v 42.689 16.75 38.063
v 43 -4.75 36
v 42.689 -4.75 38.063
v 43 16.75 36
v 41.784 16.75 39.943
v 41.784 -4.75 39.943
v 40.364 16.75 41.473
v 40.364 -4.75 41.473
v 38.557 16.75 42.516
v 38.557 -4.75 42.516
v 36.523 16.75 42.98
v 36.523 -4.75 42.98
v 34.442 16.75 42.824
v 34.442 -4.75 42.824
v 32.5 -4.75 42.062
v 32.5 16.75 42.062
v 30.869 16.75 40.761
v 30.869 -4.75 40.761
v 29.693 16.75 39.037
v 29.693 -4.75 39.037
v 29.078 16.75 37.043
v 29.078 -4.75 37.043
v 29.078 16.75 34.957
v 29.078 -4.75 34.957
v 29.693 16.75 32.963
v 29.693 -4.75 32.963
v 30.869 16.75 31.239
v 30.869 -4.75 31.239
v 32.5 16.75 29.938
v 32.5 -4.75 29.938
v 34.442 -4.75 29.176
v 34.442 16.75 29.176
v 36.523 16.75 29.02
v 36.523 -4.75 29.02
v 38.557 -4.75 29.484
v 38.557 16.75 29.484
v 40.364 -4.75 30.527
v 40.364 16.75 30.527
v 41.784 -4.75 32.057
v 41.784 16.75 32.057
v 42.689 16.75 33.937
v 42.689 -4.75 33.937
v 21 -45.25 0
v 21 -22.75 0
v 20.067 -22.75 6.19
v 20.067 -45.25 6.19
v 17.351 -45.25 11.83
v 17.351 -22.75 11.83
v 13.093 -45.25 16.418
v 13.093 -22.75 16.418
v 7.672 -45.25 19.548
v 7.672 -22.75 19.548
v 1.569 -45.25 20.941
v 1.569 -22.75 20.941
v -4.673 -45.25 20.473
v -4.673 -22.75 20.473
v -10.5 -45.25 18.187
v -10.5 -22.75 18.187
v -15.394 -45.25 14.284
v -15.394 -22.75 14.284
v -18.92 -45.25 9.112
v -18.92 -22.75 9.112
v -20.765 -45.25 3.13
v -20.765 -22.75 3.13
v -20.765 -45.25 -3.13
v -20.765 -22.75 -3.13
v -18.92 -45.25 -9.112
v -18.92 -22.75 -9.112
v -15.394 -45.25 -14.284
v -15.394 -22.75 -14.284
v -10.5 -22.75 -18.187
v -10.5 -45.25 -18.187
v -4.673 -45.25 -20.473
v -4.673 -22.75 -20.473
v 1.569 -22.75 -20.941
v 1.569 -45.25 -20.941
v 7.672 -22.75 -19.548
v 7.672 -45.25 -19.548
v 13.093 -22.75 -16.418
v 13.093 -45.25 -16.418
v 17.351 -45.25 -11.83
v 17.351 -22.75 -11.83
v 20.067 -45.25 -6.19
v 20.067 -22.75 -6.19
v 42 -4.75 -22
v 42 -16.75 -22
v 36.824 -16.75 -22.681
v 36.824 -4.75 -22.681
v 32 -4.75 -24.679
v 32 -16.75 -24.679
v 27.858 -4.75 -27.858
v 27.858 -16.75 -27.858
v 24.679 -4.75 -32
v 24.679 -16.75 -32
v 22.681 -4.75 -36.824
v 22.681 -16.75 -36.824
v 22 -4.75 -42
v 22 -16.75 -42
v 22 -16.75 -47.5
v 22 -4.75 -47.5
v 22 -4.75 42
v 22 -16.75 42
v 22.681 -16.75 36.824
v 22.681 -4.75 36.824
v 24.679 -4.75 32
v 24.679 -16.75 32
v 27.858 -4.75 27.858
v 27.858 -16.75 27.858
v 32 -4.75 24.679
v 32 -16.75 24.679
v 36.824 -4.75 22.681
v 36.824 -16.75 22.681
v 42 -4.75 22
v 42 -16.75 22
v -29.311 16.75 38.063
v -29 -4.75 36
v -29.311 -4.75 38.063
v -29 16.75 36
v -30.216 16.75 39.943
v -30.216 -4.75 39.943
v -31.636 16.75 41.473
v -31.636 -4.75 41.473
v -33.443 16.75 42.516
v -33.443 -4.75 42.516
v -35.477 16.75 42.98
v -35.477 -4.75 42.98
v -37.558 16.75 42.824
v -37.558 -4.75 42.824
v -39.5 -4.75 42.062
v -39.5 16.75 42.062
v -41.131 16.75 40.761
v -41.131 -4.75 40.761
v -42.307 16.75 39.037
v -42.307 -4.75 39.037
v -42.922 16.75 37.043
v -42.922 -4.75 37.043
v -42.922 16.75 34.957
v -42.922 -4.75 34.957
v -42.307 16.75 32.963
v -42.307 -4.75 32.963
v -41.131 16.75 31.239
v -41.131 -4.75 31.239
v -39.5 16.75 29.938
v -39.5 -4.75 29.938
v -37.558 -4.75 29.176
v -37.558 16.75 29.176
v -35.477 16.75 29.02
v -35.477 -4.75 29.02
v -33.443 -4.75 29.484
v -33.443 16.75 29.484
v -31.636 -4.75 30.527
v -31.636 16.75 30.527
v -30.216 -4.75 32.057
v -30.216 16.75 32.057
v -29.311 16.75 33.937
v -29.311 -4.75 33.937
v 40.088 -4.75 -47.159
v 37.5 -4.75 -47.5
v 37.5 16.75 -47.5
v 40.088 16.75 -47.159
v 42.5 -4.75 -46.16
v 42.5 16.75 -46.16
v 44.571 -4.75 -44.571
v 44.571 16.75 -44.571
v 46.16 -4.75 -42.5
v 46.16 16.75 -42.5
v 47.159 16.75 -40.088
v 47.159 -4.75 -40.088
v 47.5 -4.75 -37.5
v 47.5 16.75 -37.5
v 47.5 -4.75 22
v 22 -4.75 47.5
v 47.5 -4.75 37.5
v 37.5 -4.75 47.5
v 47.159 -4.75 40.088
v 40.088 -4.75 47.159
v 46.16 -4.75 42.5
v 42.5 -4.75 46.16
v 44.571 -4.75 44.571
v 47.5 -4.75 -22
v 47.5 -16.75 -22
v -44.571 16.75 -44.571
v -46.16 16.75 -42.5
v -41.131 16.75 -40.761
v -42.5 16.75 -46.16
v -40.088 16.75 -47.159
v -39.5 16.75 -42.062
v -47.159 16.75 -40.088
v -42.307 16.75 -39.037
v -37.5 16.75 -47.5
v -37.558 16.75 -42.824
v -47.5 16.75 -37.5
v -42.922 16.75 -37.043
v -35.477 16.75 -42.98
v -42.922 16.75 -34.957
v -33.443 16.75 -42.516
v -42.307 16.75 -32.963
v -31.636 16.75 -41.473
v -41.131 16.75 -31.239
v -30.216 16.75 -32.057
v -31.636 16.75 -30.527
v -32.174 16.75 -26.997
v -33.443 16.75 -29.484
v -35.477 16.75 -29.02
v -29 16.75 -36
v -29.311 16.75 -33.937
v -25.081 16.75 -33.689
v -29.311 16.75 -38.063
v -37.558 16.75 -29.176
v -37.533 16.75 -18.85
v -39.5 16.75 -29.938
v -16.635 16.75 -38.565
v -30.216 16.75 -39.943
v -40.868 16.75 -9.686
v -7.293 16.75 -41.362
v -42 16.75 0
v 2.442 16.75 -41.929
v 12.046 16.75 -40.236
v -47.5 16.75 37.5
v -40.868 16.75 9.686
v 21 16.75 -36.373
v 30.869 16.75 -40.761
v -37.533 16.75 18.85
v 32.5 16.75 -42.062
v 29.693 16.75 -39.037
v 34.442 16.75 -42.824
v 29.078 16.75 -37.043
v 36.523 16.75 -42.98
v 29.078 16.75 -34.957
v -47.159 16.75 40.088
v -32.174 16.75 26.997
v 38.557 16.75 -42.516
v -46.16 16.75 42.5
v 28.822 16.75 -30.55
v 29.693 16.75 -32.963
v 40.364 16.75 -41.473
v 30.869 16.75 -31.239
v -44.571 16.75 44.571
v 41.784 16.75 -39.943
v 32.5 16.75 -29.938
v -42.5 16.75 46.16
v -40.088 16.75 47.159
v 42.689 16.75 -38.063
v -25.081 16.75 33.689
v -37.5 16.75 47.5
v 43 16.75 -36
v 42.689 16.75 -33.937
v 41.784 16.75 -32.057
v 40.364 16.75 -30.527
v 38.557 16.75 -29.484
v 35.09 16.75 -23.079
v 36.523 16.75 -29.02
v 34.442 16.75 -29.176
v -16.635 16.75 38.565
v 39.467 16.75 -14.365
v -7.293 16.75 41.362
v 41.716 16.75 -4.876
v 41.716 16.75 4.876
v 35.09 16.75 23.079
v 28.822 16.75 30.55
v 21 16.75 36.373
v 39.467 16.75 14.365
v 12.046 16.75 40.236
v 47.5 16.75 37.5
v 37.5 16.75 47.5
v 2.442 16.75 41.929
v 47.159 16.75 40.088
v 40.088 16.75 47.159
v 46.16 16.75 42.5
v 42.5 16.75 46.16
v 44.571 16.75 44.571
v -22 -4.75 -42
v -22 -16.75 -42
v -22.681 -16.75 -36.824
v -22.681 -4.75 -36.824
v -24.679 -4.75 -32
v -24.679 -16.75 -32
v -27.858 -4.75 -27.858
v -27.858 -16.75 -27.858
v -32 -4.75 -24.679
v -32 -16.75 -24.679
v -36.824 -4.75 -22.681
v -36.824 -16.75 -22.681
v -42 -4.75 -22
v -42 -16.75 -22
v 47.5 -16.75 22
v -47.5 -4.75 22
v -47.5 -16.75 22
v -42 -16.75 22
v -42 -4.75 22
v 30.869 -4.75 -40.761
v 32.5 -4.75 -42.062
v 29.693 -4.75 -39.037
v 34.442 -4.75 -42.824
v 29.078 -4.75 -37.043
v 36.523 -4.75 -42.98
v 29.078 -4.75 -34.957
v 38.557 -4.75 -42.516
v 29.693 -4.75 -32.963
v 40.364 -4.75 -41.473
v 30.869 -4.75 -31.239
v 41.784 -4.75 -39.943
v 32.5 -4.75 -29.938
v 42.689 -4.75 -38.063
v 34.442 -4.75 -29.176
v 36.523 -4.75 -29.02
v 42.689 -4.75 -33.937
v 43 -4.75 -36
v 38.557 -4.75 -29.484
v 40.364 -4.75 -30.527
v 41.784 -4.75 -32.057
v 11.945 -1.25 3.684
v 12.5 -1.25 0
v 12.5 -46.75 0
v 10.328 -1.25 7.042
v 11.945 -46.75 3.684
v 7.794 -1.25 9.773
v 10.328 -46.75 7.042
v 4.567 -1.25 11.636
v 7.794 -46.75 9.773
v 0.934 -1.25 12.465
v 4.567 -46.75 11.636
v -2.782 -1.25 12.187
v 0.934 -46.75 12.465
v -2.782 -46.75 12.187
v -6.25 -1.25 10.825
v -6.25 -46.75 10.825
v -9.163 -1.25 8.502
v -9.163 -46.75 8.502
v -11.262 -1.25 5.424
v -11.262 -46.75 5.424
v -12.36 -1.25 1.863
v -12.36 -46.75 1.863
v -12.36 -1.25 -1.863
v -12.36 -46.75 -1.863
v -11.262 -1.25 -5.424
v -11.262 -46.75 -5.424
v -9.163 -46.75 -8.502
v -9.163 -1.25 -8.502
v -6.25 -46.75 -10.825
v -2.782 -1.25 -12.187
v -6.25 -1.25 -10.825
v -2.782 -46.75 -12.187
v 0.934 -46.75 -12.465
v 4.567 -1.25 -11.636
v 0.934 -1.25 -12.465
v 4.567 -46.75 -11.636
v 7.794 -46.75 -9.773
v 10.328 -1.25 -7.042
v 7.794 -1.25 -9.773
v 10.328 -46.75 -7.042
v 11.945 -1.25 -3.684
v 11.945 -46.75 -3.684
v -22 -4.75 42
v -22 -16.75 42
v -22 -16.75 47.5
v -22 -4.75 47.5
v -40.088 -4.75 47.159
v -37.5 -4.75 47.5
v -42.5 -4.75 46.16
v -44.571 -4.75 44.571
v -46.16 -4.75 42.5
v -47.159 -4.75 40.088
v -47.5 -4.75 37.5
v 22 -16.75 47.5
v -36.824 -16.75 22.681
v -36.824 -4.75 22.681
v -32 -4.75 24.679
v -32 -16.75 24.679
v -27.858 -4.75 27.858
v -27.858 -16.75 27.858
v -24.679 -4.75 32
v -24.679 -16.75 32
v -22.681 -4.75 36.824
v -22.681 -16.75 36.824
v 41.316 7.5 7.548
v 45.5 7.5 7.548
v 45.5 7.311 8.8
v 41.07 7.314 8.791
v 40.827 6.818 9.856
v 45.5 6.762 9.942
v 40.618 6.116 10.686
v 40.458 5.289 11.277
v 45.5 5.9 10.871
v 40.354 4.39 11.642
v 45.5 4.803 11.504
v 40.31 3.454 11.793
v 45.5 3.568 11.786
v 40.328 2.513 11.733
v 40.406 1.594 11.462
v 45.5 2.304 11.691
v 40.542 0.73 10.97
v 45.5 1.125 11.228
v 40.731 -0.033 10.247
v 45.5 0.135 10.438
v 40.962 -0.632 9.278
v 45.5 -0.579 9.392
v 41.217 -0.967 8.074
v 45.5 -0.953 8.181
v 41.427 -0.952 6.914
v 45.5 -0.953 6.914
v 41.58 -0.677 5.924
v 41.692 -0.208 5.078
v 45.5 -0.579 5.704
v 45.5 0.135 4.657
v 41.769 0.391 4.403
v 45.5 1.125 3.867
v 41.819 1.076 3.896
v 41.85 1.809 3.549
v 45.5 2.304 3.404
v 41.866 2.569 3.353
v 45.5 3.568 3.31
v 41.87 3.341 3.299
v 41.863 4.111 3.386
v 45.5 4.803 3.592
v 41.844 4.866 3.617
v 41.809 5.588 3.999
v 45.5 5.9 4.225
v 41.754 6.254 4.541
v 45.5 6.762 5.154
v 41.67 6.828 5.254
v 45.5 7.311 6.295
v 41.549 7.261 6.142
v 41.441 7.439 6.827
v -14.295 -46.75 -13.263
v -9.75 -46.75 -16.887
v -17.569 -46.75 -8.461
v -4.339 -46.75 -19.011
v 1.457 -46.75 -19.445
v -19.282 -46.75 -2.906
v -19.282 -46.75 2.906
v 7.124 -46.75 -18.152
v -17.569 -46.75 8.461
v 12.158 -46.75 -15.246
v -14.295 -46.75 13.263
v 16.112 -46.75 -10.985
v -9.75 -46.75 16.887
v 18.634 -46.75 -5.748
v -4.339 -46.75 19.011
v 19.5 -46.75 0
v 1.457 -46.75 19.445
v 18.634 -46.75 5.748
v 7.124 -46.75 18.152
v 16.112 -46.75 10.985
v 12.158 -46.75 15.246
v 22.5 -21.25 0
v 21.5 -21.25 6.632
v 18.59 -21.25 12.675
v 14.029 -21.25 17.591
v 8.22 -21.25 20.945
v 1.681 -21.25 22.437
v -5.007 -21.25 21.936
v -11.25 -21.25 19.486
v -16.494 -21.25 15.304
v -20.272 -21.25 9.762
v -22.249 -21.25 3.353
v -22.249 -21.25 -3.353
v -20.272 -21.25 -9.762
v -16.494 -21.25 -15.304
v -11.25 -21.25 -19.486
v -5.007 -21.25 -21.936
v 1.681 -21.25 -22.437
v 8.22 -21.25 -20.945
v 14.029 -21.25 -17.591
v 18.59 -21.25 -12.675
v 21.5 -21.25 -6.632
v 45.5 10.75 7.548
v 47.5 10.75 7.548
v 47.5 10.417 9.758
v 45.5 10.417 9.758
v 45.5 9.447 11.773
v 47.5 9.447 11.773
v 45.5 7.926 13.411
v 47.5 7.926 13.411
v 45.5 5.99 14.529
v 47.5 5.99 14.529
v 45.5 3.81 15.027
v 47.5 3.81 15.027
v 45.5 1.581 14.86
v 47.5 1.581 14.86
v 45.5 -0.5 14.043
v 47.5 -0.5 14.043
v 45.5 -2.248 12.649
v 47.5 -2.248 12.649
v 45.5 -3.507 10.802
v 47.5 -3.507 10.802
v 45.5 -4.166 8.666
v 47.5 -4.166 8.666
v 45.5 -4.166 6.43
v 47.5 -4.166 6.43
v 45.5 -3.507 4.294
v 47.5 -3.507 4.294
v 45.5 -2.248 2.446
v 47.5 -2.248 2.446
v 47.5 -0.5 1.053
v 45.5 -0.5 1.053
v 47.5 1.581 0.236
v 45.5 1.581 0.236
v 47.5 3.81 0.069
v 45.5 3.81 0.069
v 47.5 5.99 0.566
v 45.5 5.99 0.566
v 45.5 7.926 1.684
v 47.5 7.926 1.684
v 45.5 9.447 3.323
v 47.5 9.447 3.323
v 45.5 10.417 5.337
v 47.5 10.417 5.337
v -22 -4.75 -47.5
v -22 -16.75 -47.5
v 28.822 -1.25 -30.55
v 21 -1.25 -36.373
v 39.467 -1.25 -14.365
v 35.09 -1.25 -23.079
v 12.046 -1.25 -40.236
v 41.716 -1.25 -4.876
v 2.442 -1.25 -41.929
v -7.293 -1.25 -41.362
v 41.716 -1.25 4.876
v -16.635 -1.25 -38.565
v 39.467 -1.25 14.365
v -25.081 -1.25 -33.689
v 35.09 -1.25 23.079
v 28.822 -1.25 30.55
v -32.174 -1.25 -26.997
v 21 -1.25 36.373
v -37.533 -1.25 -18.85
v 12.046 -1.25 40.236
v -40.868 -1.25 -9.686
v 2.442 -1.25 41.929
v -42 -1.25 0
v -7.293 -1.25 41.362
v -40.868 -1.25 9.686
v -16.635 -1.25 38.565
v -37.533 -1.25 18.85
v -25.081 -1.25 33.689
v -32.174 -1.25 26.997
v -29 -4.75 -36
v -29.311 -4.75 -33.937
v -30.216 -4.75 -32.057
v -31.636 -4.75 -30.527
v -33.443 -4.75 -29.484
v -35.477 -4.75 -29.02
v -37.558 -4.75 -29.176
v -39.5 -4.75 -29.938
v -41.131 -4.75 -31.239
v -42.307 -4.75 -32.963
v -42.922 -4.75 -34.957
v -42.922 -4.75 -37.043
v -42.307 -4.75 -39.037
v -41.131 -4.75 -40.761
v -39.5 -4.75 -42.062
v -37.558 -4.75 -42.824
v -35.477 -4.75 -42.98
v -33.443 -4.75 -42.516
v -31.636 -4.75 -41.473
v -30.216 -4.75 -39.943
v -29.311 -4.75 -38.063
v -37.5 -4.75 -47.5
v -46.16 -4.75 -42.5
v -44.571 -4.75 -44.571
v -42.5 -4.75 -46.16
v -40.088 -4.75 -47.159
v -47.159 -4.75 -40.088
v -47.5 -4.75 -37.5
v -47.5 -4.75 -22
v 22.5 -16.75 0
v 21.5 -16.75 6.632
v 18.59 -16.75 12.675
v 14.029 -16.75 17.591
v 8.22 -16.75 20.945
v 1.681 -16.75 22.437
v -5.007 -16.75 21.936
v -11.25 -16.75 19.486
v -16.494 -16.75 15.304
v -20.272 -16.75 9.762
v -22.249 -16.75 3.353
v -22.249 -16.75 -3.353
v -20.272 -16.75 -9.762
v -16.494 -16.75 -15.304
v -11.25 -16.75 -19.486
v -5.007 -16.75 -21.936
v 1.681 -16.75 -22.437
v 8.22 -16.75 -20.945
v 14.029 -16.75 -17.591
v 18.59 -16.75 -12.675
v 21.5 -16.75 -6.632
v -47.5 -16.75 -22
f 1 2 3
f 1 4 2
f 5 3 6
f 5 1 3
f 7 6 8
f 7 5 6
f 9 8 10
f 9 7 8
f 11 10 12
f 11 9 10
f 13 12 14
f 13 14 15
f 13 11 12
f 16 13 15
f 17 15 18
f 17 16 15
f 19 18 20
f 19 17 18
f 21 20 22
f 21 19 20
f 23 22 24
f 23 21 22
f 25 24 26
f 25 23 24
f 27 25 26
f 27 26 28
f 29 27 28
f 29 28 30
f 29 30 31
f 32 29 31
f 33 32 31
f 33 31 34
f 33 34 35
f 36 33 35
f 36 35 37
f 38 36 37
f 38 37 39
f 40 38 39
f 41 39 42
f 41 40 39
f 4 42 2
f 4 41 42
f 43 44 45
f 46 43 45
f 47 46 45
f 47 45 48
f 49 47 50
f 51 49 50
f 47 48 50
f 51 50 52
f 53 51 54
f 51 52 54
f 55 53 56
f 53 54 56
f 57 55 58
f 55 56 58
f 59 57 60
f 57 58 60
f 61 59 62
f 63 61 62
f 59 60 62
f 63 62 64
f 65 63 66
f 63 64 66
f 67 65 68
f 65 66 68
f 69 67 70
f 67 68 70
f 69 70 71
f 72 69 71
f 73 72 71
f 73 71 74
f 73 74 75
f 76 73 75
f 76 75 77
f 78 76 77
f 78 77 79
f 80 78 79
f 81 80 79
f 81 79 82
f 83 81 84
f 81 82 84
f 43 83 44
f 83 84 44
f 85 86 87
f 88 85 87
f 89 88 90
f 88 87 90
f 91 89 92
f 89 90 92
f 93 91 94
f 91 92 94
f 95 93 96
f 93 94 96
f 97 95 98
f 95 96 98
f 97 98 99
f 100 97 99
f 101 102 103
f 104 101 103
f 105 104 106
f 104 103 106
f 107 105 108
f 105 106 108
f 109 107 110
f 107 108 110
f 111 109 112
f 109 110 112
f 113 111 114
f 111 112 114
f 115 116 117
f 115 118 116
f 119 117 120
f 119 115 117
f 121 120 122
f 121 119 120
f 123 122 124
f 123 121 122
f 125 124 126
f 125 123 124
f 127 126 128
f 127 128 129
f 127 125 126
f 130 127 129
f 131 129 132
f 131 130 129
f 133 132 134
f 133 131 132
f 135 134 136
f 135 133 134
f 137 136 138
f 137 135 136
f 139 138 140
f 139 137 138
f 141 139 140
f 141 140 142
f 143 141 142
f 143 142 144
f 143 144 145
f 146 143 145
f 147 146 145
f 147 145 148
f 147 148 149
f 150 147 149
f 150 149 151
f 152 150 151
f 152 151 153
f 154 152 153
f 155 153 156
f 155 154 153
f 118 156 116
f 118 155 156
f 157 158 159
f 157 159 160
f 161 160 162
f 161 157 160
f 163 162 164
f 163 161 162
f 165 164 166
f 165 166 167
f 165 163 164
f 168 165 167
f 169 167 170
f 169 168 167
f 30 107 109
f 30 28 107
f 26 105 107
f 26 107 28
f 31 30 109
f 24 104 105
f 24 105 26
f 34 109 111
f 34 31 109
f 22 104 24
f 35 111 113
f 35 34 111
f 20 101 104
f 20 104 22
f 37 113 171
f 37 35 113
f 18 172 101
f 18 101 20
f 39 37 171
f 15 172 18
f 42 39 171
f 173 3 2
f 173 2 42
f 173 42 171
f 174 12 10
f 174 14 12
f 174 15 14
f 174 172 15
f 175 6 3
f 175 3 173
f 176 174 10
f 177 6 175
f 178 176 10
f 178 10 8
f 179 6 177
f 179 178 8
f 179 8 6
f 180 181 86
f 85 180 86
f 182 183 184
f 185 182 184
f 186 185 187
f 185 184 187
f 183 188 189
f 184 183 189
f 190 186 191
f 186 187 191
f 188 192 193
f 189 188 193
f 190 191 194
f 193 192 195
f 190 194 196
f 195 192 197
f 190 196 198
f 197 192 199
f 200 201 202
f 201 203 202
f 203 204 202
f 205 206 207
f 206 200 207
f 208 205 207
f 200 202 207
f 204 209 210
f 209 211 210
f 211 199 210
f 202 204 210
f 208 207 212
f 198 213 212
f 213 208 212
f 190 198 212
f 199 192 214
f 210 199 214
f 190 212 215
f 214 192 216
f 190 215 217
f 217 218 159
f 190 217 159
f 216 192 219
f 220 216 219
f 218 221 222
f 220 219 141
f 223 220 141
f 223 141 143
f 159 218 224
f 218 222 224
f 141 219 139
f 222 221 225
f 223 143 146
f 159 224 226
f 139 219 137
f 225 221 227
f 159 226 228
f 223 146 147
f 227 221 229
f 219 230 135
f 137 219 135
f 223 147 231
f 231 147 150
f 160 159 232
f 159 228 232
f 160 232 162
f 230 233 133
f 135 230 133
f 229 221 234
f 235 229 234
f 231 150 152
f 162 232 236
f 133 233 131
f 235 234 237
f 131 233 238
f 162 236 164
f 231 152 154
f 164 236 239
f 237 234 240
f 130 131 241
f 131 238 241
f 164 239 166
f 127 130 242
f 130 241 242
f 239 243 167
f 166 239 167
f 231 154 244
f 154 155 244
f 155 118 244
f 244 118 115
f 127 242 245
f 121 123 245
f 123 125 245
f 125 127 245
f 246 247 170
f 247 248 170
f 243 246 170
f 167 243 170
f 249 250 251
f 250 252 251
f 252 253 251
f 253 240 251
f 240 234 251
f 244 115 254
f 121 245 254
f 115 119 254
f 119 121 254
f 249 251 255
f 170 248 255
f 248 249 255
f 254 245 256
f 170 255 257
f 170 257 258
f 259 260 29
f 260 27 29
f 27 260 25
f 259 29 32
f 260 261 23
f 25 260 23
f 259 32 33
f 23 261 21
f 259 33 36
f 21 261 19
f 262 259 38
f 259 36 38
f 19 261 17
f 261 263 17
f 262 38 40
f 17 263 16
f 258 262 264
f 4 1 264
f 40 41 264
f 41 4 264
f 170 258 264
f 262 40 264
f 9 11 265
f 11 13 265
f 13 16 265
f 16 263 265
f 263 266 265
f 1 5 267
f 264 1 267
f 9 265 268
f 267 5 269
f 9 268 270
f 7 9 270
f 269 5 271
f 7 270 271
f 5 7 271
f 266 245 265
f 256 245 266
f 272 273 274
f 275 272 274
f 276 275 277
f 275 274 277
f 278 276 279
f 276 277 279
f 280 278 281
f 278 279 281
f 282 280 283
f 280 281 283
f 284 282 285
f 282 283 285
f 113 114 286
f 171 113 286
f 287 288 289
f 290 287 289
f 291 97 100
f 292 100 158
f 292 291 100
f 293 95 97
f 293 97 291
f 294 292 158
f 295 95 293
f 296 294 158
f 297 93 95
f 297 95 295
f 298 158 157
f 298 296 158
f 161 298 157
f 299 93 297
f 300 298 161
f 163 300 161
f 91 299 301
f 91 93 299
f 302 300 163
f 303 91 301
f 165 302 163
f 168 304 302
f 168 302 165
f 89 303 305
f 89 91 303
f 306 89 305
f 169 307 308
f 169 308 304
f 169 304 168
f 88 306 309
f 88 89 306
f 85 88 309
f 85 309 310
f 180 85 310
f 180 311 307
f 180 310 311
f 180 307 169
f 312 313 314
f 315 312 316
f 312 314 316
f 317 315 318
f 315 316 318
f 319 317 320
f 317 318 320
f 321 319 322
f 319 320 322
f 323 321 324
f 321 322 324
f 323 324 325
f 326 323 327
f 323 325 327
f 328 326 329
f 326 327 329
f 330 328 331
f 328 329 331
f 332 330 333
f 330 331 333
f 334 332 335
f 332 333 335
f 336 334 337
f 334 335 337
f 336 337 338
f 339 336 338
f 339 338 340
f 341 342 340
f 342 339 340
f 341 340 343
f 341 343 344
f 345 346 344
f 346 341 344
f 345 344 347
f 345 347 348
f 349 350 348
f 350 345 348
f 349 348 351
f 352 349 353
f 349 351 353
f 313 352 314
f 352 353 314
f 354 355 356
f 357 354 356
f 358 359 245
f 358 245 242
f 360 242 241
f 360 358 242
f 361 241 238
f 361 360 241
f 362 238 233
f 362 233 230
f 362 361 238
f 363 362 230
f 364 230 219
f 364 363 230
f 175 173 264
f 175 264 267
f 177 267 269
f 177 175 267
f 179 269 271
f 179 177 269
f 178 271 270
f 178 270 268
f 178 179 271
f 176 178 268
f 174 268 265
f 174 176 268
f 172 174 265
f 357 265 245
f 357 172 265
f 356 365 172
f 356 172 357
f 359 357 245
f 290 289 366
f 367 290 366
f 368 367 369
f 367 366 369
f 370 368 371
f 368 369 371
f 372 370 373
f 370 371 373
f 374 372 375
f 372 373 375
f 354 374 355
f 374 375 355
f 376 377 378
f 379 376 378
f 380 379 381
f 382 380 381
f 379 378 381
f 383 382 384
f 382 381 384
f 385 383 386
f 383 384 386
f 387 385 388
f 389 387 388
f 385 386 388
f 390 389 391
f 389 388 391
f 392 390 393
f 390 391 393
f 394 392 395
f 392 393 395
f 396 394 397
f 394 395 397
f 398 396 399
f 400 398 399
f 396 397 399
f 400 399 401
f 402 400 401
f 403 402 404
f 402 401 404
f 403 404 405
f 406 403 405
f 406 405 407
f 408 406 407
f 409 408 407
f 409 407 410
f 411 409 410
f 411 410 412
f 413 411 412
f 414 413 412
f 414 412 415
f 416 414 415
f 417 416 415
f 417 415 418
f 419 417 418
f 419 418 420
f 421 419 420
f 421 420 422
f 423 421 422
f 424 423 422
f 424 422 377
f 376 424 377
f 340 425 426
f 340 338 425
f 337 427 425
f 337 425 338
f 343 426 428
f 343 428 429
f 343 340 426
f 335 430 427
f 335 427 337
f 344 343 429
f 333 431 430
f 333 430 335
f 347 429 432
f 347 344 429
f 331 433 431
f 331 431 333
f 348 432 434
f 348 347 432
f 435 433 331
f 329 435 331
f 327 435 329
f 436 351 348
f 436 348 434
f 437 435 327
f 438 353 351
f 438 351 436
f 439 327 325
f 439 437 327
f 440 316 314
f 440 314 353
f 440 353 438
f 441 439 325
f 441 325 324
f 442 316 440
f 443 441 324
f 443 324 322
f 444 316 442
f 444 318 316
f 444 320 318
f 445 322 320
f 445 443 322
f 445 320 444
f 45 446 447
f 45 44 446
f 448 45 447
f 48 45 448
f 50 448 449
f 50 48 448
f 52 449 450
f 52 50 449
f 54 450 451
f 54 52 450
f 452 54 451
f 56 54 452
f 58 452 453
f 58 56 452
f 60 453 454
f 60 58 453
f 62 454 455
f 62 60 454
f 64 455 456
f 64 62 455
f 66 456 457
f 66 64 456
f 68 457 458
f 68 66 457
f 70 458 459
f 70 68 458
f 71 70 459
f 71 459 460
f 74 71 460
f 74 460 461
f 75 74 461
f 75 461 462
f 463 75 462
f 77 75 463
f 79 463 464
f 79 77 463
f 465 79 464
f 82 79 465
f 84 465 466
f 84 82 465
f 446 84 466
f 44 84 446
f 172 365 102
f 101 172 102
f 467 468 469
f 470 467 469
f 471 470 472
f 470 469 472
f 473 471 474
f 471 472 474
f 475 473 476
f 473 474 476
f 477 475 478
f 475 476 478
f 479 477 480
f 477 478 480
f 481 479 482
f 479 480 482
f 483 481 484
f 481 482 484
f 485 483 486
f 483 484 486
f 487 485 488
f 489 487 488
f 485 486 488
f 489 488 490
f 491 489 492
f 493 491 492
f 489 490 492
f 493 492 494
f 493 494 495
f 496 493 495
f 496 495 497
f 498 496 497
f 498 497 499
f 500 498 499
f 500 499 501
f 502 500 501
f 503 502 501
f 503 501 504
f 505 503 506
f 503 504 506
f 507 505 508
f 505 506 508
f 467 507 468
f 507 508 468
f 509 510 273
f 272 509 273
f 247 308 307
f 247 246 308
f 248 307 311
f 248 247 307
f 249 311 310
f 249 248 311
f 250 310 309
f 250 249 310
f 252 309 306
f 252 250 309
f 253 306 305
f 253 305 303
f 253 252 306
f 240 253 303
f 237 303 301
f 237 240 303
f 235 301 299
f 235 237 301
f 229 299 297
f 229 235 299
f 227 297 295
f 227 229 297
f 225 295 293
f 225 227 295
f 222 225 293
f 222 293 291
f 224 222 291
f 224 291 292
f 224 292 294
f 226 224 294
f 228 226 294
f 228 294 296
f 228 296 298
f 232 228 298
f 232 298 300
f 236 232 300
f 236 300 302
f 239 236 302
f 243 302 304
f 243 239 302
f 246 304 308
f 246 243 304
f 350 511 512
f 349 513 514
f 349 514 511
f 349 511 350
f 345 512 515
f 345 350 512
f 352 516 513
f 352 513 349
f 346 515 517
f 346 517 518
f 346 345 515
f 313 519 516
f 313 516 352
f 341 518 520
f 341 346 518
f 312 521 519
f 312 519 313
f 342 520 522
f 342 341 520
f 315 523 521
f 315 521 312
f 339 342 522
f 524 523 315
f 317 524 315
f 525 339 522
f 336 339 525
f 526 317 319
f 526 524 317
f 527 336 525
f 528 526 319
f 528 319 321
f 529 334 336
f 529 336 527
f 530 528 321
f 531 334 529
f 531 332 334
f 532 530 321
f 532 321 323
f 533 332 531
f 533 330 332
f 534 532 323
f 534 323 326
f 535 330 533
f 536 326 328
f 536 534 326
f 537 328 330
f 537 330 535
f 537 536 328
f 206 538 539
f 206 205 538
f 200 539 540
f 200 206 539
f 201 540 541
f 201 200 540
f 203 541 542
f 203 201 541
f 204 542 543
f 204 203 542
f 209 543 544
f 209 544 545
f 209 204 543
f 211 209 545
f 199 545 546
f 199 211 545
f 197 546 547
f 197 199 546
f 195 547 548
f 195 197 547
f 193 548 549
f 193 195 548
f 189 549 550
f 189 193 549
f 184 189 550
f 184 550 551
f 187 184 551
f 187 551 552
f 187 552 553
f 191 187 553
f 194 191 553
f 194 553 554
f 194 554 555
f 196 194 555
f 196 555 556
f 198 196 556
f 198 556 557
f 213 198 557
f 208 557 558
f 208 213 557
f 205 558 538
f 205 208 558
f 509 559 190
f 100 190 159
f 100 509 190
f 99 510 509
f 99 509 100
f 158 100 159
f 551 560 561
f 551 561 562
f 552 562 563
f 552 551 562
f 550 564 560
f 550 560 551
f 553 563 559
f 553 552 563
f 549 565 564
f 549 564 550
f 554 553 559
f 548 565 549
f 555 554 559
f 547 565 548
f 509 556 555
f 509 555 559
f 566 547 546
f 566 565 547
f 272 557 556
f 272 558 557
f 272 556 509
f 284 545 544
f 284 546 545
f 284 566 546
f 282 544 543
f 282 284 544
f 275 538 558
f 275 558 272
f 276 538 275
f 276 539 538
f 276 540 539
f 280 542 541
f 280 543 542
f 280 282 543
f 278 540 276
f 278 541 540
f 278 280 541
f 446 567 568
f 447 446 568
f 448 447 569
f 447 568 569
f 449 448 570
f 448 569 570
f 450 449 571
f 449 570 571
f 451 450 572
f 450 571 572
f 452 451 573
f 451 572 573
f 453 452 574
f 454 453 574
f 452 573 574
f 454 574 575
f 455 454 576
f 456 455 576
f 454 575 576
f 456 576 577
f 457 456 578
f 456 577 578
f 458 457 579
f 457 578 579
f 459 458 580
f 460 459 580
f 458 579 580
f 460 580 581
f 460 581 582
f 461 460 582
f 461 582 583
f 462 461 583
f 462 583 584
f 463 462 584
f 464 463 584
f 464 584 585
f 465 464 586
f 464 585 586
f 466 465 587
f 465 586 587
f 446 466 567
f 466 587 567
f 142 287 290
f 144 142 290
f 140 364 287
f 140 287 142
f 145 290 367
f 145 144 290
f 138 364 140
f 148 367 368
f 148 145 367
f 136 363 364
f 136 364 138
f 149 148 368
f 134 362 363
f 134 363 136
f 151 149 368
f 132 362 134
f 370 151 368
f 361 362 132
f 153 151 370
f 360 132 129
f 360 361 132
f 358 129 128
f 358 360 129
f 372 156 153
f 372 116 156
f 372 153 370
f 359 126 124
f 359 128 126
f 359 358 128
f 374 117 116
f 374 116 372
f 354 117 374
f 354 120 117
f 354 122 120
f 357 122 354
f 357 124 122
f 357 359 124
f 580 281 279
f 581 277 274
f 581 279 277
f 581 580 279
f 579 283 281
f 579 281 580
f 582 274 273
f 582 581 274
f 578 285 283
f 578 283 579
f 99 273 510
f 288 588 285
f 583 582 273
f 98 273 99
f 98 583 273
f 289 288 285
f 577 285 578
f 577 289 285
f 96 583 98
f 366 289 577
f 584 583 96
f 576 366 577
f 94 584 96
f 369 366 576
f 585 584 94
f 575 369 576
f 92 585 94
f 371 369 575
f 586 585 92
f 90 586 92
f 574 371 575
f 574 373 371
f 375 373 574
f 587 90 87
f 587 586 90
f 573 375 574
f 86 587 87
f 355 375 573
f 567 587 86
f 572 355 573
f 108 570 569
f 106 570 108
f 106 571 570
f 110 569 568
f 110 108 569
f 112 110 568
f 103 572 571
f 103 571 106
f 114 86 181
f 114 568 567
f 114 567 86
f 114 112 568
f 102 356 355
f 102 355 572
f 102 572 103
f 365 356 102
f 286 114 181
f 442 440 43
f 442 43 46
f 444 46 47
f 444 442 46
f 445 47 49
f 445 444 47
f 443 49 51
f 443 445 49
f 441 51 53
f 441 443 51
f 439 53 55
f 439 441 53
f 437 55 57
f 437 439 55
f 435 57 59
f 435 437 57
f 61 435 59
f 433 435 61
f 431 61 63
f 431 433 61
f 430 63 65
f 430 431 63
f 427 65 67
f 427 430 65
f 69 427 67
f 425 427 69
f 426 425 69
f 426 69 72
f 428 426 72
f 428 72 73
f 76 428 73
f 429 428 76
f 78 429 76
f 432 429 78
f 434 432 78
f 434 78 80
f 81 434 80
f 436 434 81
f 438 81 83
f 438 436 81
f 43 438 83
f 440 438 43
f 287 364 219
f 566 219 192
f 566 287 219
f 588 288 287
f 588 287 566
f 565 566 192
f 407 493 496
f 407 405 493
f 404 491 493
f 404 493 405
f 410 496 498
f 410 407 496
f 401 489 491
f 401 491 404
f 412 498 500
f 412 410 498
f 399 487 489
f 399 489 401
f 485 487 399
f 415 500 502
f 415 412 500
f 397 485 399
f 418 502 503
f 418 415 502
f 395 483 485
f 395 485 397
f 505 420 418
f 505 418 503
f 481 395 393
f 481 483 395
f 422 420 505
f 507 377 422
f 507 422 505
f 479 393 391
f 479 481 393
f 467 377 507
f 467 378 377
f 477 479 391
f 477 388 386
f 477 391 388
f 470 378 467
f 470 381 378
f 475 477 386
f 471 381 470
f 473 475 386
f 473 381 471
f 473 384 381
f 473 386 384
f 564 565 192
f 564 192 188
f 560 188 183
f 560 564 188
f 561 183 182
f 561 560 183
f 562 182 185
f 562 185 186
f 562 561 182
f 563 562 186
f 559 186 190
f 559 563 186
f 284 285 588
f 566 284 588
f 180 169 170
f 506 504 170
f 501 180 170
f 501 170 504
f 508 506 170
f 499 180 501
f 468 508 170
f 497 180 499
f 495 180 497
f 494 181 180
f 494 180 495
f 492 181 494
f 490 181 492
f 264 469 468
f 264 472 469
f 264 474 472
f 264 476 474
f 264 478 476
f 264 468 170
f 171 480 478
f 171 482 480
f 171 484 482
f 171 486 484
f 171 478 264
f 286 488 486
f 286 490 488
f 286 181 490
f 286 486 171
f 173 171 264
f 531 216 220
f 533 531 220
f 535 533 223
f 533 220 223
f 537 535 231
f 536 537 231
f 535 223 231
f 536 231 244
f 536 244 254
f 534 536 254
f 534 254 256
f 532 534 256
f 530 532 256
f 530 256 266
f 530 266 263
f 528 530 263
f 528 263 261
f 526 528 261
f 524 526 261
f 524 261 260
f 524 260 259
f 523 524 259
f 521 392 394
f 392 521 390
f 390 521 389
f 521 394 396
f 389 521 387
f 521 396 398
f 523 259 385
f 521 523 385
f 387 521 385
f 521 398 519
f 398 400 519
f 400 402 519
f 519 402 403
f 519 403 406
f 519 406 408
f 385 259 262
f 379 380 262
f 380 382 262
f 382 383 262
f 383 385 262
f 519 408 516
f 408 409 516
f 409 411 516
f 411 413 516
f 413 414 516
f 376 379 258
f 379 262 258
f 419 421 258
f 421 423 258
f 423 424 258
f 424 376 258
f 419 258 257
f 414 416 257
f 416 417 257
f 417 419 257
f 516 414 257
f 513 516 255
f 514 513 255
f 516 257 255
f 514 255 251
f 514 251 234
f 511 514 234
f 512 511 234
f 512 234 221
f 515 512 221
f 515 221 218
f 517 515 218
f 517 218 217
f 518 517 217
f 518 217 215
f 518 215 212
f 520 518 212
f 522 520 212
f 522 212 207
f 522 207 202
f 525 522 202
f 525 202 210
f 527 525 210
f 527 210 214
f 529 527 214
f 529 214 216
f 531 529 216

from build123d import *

# Parameters (mm, degrees)
F0_R      = 7
F1_DEPTH  = 16.75
F2_R      = 7
F3_DEPTH  = 12
F4_R      = 22.5
F5_DEPTH  = 6
F6_SIZE   = 1.5
F7_R      = 21
F8_DEPTH  = 24
F9_SIZE   = 1.5
F10_R     = 12.5
F11_DEPTH = 63.501
F12_R     = 42
F12_R_2   = 12.5
F13_DEPTH = 18
F14_R     = 7.5
F14_R_2   = 4.25
F15_DEPTH = 2
F16_DEPTH = 9


with BuildPart() as f1:
    # F0 (on Front) → F1 (new body, symmetric)
    with BuildSketch(Plane.XZ):
        with BuildLine():
            Line((-37.5, -47.5), (37.5, -47.5))
            ThreePointArc((37.5, -47.5), (44.5710678119, -44.5710678119), (47.5, -37.5))
            Line((47.5, -37.5), (47.5, 37.5))
            ThreePointArc((47.5, 37.5), (44.5710678119, 44.5710678119), (37.5, 47.5))
            Line((37.5, 47.5), (-37.5, 47.5))
            ThreePointArc((-37.5, 47.5), (-44.5710678119, 44.5710678119), (-47.5, 37.5))
            Line((-47.5, 37.5), (-47.5, -37.5))
            ThreePointArc((-47.5, -37.5), (-44.5710678119, -44.5710678119), (-37.5, -47.5))
        make_face()
        with Locations((-36, -36)):
            Circle(F0_R, mode=Mode.SUBTRACT)
        with Locations((36, -36)):
            Circle(F0_R, mode=Mode.SUBTRACT)
        with Locations((-36, 36)):
            Circle(F0_R, mode=Mode.SUBTRACT)
        with Locations((36, 36)):
            Circle(F0_R, mode=Mode.SUBTRACT)
    extrude(amount=F1_DEPTH, both=True)

    # F2 (on face) → F3 (cut)
    with BuildSketch(Plane.XZ.offset(16.75)):
        with BuildLine():
            Line((22, -42), (22, -47.5))
            Line((22, -47.5), (37.5, -47.5))
            ThreePointArc((37.5, -47.5), (44.5710678119, -44.5710678119), (47.5, -37.5))
            Line((47.5, -37.5), (47.5, -22))
            Line((47.5, -22), (42, -22))
            ThreePointArc((42, -22), (27.8578643763, -27.8578643763), (22, -42))
        make_face()
        with Locations((36, -36)):
            Circle(F2_R, mode=Mode.SUBTRACT)
        with BuildLine():
            Line((37.5, 47.5), (22, 47.5))
            Line((22, 47.5), (22, 42))
            ThreePointArc((22, 42), (27.8578643763, 27.8578643763), (42, 22))
            Line((42, 22), (47.5, 22))
            Line((47.5, 22), (47.5, 37.5))
            ThreePointArc((47.5, 37.5), (44.5710678119, 44.5710678119), (37.5, 47.5))
        make_face()
        with Locations((36, 36)):
            Circle(F2_R, mode=Mode.SUBTRACT)
        with BuildLine():
            Line((-47.5, 37.5), (-47.5, 22))
            Line((-47.5, 22), (-42, 22))
            ThreePointArc((-42, 22), (-27.8578643763, 27.8578643763), (-22, 42))
            Line((-22, 42), (-22, 47.5))
            Line((-22, 47.5), (-37.5, 47.5))
            ThreePointArc((-37.5, 47.5), (-44.5710678119, 44.5710678119), (-47.5, 37.5))
        make_face()
        with Locations((-36, 36)):
            Circle(F2_R, mode=Mode.SUBTRACT)
        with BuildLine():
            Line((-42, -22), (-47.5, -22))
            Line((-47.5, -22), (-47.5, -37.5))
            ThreePointArc((-47.5, -37.5), (-44.5710678119, -44.5710678119), (-37.5, -47.5))
            Line((-37.5, -47.5), (-22, -47.5))
            Line((-22, -47.5), (-22, -42))
            ThreePointArc((-22, -42), (-27.8578643763, -27.8578643763), (-42, -22))
        make_face()
        with Locations((-36, -36)):
            Circle(F2_R, mode=Mode.SUBTRACT)
    extrude(amount=-F3_DEPTH, mode=Mode.SUBTRACT)

    # F4 (on face) → F5 (join)
    with BuildSketch(Plane.XZ.offset(16.75)):
        Circle(F4_R)
    extrude(amount=F5_DEPTH)

    # F6
    f6_edges = [f1.edges().sort_by_distance(p)[0] for p in [
        (-22.5, -22.75, 0),
    ]]
    chamfer(f6_edges, length=F6_SIZE)

    # F7 (on face) → F8 (join)
    with BuildSketch(Plane.XZ.offset(22.75)):
        Circle(F7_R)
    extrude(amount=F8_DEPTH)

    # F9
    f9_edges = [f1.edges().sort_by_distance(p)[0] for p in [
        (-21, -46.75, 0),
    ]]
    chamfer(f9_edges, length=F9_SIZE)

    # F10 (on face) → F11 (cut, through all)
    with BuildSketch(Plane.XZ.offset(46.75)):
        Circle(F10_R)
    extrude(amount=-F11_DEPTH, mode=Mode.SUBTRACT)

    # F12 (on face) → F13 (cut)
    with BuildSketch(Plane(origin=(0, 16.75, 0), x_dir=(-1, 0, 0), z_dir=(0, 1, 0))):
        Circle(F12_R)
        Circle(F12_R_2, mode=Mode.SUBTRACT)
    extrude(amount=-F13_DEPTH, mode=Mode.SUBTRACT)

    # F14 (on face) → F15 (cut)
    with BuildSketch(Plane.YZ.offset(47.5)):
        with Locations((3.25, 7.547759451)):
            Circle(F14_R)
        with Locations((3.25, 7.547759451)):
            Circle(F14_R_2, mode=Mode.SUBTRACT)
    extrude(amount=-F15_DEPTH, mode=Mode.SUBTRACT)

    # F16 (cut): a face of the model
    f16_faces = [f1.faces().sort_by_distance(p)[0] for p in [
        (47.5, 3.25, 7.547759451),
    ]]
    extrude(f16_faces, amount=-F16_DEPTH, mode=Mode.SUBTRACT)


solid = f1.part
